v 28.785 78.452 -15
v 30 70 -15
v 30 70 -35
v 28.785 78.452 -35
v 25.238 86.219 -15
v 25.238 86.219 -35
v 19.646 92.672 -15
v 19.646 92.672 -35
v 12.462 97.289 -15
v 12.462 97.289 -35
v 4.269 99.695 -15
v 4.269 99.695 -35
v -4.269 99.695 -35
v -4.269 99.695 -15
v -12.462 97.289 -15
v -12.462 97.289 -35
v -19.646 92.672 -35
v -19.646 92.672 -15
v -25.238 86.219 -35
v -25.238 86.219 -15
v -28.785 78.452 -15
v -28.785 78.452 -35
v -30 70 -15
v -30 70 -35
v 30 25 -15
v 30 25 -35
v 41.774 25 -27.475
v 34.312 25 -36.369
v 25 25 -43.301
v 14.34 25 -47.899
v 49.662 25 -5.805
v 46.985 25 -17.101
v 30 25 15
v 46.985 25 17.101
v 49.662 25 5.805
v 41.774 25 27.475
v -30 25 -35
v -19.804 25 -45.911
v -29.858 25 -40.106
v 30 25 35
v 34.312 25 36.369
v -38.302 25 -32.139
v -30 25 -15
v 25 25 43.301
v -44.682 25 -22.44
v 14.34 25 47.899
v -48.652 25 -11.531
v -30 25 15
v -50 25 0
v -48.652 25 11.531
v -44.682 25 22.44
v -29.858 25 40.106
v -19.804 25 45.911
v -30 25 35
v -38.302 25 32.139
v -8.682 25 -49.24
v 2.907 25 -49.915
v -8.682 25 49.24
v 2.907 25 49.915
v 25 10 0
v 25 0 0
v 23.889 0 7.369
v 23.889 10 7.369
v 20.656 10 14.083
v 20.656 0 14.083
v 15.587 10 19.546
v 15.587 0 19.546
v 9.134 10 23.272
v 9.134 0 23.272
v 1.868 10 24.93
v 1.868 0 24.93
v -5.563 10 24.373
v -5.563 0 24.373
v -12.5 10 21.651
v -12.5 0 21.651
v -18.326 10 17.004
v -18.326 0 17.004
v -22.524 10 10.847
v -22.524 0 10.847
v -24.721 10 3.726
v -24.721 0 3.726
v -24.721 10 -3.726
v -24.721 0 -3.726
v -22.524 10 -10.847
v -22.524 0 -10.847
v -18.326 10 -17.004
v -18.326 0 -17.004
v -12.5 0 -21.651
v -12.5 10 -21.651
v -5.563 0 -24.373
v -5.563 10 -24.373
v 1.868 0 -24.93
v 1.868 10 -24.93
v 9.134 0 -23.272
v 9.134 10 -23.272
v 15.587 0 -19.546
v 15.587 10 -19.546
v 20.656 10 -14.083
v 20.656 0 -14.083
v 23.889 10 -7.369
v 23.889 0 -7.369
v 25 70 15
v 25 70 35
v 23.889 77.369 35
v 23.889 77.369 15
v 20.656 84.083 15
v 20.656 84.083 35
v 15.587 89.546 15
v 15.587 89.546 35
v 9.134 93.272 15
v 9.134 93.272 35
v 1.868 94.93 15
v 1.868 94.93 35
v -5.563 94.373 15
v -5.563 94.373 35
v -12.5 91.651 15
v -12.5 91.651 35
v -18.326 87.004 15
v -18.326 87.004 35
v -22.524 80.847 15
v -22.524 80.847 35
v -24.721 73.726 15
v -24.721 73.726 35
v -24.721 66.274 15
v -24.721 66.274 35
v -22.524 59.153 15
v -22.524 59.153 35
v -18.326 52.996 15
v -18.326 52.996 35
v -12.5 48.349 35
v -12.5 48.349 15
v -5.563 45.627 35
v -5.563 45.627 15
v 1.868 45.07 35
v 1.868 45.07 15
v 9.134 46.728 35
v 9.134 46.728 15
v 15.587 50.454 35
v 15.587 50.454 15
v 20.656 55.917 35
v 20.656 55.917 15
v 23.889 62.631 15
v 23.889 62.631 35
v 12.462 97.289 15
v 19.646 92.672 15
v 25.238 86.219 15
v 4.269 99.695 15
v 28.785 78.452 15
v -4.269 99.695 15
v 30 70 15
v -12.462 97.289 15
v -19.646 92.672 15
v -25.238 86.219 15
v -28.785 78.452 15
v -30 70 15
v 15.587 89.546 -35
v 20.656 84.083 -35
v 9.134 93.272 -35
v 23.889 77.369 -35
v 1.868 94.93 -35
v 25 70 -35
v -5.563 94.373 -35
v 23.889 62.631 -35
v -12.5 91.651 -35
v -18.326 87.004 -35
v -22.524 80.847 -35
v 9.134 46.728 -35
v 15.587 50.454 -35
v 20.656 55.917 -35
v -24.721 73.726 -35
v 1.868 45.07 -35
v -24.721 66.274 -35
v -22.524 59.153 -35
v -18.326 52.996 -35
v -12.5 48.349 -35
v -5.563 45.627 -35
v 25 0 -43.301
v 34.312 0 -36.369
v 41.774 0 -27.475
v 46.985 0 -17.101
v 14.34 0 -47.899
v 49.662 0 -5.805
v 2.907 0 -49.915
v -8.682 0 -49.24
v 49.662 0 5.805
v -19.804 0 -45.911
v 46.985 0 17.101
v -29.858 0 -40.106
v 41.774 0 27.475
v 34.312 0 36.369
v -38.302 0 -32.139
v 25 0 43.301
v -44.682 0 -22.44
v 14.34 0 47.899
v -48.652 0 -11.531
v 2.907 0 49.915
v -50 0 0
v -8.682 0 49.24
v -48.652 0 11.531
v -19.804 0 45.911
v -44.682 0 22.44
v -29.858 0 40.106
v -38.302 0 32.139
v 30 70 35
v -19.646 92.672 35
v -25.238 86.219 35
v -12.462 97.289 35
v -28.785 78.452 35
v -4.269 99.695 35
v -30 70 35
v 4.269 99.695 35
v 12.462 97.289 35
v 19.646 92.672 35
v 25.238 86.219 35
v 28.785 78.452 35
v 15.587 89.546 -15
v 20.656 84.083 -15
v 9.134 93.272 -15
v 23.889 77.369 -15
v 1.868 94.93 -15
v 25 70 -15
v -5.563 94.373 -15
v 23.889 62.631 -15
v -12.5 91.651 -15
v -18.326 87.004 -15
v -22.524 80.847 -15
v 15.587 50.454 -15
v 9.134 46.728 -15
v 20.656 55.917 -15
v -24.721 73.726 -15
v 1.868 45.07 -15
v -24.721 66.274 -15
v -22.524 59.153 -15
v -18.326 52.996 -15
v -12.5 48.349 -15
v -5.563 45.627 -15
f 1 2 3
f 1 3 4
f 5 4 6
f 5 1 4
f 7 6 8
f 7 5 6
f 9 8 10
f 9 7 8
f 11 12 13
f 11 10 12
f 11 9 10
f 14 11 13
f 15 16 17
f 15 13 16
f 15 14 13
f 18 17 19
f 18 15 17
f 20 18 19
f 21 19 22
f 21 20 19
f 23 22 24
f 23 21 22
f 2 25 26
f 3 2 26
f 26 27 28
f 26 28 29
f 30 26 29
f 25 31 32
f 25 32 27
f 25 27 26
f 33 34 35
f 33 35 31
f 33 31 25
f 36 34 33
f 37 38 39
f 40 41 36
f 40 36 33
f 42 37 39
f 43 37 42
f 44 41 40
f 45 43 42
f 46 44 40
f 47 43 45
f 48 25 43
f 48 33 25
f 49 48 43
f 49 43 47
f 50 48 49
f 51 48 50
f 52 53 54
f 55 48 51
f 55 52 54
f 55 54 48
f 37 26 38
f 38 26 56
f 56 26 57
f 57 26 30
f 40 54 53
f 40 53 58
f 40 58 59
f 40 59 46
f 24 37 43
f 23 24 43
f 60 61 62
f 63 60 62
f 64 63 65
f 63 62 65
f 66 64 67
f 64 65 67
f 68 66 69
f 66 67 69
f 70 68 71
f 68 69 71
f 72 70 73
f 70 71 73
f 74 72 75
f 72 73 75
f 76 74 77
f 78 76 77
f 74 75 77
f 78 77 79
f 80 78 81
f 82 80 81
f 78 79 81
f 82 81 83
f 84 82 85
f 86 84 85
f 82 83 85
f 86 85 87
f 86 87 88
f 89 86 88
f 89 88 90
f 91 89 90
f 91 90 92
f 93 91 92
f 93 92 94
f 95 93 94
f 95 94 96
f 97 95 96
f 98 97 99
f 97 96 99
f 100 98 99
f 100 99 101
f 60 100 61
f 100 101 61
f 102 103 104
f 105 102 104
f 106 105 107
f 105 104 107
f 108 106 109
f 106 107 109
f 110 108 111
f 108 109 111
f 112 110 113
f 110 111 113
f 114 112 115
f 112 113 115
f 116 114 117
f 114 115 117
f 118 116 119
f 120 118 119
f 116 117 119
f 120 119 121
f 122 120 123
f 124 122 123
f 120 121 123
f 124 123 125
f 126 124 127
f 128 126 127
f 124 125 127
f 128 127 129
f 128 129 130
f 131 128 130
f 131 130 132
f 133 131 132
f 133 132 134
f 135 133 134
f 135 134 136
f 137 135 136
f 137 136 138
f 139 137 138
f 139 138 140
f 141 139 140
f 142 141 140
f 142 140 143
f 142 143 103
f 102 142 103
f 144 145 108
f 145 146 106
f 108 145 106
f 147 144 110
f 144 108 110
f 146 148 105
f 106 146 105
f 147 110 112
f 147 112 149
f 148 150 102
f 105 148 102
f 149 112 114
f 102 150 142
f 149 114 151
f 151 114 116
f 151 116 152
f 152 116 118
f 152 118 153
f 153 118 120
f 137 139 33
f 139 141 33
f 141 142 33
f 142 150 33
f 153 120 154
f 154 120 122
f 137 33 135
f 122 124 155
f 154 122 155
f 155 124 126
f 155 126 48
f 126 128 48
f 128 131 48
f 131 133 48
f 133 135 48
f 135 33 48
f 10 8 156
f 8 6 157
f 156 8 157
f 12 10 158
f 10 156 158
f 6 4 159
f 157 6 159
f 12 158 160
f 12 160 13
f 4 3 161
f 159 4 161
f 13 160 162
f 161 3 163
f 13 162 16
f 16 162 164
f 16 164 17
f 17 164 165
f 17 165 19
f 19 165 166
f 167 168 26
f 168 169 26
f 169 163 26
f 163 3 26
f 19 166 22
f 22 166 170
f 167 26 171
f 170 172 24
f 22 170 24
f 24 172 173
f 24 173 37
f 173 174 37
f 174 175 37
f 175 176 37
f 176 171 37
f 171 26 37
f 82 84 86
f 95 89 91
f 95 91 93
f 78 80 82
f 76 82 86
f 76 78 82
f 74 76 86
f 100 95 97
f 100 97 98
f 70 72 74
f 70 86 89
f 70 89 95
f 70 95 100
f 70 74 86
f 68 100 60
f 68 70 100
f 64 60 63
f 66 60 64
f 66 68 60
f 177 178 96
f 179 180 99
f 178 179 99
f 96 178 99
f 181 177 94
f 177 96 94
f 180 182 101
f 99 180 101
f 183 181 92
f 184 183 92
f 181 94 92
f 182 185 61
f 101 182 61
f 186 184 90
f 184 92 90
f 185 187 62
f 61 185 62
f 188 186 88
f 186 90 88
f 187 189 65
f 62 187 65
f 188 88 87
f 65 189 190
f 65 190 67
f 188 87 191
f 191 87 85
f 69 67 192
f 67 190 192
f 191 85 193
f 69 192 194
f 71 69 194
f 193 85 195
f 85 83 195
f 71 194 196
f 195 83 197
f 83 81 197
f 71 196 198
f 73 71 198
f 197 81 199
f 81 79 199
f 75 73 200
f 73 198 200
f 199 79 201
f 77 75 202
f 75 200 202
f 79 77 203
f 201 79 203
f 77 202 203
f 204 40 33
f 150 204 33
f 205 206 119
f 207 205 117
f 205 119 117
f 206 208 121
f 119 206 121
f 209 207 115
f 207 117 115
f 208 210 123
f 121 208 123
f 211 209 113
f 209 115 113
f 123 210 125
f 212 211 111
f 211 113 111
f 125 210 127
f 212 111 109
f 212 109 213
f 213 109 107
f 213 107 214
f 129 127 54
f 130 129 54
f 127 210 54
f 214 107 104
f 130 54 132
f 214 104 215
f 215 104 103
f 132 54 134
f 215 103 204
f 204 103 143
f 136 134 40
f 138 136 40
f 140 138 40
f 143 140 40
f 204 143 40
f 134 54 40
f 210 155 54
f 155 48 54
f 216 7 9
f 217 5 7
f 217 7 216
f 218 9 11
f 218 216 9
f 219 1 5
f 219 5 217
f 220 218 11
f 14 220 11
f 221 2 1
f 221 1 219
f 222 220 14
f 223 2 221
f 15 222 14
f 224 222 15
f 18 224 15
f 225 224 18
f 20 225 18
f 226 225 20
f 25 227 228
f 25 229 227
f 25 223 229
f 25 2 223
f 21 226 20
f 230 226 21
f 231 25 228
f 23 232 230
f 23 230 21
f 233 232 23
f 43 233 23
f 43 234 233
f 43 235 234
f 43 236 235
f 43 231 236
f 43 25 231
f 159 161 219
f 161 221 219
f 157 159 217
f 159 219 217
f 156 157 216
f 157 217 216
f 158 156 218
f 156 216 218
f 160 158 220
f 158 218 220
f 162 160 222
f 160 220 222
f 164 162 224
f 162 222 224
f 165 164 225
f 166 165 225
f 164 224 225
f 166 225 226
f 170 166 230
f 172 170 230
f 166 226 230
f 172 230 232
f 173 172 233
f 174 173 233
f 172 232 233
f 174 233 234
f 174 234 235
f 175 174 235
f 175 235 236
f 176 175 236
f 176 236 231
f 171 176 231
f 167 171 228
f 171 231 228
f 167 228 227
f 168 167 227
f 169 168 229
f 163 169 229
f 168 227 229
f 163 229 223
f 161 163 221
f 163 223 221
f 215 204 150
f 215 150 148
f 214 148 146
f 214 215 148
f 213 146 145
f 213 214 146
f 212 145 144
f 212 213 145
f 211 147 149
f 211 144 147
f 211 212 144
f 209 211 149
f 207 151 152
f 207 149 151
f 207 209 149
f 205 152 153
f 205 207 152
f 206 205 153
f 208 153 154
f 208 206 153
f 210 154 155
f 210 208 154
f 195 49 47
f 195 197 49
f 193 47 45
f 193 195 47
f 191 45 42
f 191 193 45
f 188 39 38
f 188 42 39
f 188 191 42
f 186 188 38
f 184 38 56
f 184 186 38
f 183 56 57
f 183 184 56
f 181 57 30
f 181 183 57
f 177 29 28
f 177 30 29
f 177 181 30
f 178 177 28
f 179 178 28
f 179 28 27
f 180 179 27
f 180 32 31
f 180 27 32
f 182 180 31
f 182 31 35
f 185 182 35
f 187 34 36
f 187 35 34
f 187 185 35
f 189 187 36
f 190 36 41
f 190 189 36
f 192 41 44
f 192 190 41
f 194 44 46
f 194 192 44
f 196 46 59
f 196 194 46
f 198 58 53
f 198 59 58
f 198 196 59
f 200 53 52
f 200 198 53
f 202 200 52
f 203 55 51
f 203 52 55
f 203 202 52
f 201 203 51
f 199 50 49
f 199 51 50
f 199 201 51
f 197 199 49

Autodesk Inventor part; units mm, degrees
ref_plane "YZ Plane" through (0, 0, 0) normal (1, 0, 0) x (0, 1, 0)
ref_plane "XZ Plane" through (0, 0, 0) normal (0, 1, 0) x (-1, 0, 0)
ref_plane "XY Plane" through (0, 0, 0) normal (0, 0, 1) x (1, 0, 0)
sketch "Sketch1" plane through (0, 0, 0) normal (0, 1, 0) x (-1, 0, 0)
  circle A0 centre (0, 0) radius 50
  dimension "d0" = 100
extrude "Extrusion1" add sketch "Sketch1" along normal blind 25
sketch "Sketch2" plane through (0, 0, 0) normal (0, -1, 0) x (1, 0, 0)
  circle A0 centre (0, 0) radius 25
  dimension "d3" = 50
extrude "Extrusion2" cut sketch "Sketch2" against normal blind 10
sketch "Sketch3" plane through (0, 25, 0) normal (0, 1, 0) x (1, 0, 0)
  line L0 (-30, -35) -> (30, -35)
  line L1 (30, -35) -> (30, 35)
  line L2 (30, 35) -> (-30, 35)
  line L3 (-30, 35) -> (-30, -35)
  line L4 (-30, -35) -> (30, 35) construction
  line L5 (30, -35) -> (-30, 35) construction
  line L6 (-30, -35) -> (30, -35)
  line L7 (30, -35) -> (30, -15)
  line L8 (30, -15) -> (-30, -15)
  line L9 (-30, -15) -> (-30, -35)
  line L10 (-30, 35) -> (30, 35)
  line L11 (30, 35) -> (30, 15)
  line L12 (30, 15) -> (-30, 15)
  line L13 (-30, 15) -> (-30, 35)
  point P0 (0, 0)
  dimension "d6" = 60
  dimension "d7" = 70
  dimension "d8" = 20
  dimension "d9" = 20
extrude "Extrusion3" add sketch "Sketch3" along normal blind 75 contours L3 L8 L1 L0 | L3 L2 L1 L12
sketch "Sketch4" plane through (-30, 25, 35) normal (0, 0, 1) x (1, 0, 0)
  line L0 (60, 0) -> (60, 75) projected
  circle A0 centre (30, 45) radius 30
  line L1 (0, 75) -> (60, 75) projected
  line L2 (60, 0) -> (60, 75) projected
  circle A1 centre (30, 45) radius 25
  line L3 (0, 45) -> (0, 75)
  line L4 (60, 75) -> (60, 45)
  point P0 (30, -25)
  point P1 (30, 75)
  dimension "d12" = 60
  dimension "d13" = 50
extrude "Extrusion4" cut sketch "Sketch4" against normal blind 100 contours A0 L1 L0 | L3 L1 A0 | A1
properties part number "JOINT BASE2"
